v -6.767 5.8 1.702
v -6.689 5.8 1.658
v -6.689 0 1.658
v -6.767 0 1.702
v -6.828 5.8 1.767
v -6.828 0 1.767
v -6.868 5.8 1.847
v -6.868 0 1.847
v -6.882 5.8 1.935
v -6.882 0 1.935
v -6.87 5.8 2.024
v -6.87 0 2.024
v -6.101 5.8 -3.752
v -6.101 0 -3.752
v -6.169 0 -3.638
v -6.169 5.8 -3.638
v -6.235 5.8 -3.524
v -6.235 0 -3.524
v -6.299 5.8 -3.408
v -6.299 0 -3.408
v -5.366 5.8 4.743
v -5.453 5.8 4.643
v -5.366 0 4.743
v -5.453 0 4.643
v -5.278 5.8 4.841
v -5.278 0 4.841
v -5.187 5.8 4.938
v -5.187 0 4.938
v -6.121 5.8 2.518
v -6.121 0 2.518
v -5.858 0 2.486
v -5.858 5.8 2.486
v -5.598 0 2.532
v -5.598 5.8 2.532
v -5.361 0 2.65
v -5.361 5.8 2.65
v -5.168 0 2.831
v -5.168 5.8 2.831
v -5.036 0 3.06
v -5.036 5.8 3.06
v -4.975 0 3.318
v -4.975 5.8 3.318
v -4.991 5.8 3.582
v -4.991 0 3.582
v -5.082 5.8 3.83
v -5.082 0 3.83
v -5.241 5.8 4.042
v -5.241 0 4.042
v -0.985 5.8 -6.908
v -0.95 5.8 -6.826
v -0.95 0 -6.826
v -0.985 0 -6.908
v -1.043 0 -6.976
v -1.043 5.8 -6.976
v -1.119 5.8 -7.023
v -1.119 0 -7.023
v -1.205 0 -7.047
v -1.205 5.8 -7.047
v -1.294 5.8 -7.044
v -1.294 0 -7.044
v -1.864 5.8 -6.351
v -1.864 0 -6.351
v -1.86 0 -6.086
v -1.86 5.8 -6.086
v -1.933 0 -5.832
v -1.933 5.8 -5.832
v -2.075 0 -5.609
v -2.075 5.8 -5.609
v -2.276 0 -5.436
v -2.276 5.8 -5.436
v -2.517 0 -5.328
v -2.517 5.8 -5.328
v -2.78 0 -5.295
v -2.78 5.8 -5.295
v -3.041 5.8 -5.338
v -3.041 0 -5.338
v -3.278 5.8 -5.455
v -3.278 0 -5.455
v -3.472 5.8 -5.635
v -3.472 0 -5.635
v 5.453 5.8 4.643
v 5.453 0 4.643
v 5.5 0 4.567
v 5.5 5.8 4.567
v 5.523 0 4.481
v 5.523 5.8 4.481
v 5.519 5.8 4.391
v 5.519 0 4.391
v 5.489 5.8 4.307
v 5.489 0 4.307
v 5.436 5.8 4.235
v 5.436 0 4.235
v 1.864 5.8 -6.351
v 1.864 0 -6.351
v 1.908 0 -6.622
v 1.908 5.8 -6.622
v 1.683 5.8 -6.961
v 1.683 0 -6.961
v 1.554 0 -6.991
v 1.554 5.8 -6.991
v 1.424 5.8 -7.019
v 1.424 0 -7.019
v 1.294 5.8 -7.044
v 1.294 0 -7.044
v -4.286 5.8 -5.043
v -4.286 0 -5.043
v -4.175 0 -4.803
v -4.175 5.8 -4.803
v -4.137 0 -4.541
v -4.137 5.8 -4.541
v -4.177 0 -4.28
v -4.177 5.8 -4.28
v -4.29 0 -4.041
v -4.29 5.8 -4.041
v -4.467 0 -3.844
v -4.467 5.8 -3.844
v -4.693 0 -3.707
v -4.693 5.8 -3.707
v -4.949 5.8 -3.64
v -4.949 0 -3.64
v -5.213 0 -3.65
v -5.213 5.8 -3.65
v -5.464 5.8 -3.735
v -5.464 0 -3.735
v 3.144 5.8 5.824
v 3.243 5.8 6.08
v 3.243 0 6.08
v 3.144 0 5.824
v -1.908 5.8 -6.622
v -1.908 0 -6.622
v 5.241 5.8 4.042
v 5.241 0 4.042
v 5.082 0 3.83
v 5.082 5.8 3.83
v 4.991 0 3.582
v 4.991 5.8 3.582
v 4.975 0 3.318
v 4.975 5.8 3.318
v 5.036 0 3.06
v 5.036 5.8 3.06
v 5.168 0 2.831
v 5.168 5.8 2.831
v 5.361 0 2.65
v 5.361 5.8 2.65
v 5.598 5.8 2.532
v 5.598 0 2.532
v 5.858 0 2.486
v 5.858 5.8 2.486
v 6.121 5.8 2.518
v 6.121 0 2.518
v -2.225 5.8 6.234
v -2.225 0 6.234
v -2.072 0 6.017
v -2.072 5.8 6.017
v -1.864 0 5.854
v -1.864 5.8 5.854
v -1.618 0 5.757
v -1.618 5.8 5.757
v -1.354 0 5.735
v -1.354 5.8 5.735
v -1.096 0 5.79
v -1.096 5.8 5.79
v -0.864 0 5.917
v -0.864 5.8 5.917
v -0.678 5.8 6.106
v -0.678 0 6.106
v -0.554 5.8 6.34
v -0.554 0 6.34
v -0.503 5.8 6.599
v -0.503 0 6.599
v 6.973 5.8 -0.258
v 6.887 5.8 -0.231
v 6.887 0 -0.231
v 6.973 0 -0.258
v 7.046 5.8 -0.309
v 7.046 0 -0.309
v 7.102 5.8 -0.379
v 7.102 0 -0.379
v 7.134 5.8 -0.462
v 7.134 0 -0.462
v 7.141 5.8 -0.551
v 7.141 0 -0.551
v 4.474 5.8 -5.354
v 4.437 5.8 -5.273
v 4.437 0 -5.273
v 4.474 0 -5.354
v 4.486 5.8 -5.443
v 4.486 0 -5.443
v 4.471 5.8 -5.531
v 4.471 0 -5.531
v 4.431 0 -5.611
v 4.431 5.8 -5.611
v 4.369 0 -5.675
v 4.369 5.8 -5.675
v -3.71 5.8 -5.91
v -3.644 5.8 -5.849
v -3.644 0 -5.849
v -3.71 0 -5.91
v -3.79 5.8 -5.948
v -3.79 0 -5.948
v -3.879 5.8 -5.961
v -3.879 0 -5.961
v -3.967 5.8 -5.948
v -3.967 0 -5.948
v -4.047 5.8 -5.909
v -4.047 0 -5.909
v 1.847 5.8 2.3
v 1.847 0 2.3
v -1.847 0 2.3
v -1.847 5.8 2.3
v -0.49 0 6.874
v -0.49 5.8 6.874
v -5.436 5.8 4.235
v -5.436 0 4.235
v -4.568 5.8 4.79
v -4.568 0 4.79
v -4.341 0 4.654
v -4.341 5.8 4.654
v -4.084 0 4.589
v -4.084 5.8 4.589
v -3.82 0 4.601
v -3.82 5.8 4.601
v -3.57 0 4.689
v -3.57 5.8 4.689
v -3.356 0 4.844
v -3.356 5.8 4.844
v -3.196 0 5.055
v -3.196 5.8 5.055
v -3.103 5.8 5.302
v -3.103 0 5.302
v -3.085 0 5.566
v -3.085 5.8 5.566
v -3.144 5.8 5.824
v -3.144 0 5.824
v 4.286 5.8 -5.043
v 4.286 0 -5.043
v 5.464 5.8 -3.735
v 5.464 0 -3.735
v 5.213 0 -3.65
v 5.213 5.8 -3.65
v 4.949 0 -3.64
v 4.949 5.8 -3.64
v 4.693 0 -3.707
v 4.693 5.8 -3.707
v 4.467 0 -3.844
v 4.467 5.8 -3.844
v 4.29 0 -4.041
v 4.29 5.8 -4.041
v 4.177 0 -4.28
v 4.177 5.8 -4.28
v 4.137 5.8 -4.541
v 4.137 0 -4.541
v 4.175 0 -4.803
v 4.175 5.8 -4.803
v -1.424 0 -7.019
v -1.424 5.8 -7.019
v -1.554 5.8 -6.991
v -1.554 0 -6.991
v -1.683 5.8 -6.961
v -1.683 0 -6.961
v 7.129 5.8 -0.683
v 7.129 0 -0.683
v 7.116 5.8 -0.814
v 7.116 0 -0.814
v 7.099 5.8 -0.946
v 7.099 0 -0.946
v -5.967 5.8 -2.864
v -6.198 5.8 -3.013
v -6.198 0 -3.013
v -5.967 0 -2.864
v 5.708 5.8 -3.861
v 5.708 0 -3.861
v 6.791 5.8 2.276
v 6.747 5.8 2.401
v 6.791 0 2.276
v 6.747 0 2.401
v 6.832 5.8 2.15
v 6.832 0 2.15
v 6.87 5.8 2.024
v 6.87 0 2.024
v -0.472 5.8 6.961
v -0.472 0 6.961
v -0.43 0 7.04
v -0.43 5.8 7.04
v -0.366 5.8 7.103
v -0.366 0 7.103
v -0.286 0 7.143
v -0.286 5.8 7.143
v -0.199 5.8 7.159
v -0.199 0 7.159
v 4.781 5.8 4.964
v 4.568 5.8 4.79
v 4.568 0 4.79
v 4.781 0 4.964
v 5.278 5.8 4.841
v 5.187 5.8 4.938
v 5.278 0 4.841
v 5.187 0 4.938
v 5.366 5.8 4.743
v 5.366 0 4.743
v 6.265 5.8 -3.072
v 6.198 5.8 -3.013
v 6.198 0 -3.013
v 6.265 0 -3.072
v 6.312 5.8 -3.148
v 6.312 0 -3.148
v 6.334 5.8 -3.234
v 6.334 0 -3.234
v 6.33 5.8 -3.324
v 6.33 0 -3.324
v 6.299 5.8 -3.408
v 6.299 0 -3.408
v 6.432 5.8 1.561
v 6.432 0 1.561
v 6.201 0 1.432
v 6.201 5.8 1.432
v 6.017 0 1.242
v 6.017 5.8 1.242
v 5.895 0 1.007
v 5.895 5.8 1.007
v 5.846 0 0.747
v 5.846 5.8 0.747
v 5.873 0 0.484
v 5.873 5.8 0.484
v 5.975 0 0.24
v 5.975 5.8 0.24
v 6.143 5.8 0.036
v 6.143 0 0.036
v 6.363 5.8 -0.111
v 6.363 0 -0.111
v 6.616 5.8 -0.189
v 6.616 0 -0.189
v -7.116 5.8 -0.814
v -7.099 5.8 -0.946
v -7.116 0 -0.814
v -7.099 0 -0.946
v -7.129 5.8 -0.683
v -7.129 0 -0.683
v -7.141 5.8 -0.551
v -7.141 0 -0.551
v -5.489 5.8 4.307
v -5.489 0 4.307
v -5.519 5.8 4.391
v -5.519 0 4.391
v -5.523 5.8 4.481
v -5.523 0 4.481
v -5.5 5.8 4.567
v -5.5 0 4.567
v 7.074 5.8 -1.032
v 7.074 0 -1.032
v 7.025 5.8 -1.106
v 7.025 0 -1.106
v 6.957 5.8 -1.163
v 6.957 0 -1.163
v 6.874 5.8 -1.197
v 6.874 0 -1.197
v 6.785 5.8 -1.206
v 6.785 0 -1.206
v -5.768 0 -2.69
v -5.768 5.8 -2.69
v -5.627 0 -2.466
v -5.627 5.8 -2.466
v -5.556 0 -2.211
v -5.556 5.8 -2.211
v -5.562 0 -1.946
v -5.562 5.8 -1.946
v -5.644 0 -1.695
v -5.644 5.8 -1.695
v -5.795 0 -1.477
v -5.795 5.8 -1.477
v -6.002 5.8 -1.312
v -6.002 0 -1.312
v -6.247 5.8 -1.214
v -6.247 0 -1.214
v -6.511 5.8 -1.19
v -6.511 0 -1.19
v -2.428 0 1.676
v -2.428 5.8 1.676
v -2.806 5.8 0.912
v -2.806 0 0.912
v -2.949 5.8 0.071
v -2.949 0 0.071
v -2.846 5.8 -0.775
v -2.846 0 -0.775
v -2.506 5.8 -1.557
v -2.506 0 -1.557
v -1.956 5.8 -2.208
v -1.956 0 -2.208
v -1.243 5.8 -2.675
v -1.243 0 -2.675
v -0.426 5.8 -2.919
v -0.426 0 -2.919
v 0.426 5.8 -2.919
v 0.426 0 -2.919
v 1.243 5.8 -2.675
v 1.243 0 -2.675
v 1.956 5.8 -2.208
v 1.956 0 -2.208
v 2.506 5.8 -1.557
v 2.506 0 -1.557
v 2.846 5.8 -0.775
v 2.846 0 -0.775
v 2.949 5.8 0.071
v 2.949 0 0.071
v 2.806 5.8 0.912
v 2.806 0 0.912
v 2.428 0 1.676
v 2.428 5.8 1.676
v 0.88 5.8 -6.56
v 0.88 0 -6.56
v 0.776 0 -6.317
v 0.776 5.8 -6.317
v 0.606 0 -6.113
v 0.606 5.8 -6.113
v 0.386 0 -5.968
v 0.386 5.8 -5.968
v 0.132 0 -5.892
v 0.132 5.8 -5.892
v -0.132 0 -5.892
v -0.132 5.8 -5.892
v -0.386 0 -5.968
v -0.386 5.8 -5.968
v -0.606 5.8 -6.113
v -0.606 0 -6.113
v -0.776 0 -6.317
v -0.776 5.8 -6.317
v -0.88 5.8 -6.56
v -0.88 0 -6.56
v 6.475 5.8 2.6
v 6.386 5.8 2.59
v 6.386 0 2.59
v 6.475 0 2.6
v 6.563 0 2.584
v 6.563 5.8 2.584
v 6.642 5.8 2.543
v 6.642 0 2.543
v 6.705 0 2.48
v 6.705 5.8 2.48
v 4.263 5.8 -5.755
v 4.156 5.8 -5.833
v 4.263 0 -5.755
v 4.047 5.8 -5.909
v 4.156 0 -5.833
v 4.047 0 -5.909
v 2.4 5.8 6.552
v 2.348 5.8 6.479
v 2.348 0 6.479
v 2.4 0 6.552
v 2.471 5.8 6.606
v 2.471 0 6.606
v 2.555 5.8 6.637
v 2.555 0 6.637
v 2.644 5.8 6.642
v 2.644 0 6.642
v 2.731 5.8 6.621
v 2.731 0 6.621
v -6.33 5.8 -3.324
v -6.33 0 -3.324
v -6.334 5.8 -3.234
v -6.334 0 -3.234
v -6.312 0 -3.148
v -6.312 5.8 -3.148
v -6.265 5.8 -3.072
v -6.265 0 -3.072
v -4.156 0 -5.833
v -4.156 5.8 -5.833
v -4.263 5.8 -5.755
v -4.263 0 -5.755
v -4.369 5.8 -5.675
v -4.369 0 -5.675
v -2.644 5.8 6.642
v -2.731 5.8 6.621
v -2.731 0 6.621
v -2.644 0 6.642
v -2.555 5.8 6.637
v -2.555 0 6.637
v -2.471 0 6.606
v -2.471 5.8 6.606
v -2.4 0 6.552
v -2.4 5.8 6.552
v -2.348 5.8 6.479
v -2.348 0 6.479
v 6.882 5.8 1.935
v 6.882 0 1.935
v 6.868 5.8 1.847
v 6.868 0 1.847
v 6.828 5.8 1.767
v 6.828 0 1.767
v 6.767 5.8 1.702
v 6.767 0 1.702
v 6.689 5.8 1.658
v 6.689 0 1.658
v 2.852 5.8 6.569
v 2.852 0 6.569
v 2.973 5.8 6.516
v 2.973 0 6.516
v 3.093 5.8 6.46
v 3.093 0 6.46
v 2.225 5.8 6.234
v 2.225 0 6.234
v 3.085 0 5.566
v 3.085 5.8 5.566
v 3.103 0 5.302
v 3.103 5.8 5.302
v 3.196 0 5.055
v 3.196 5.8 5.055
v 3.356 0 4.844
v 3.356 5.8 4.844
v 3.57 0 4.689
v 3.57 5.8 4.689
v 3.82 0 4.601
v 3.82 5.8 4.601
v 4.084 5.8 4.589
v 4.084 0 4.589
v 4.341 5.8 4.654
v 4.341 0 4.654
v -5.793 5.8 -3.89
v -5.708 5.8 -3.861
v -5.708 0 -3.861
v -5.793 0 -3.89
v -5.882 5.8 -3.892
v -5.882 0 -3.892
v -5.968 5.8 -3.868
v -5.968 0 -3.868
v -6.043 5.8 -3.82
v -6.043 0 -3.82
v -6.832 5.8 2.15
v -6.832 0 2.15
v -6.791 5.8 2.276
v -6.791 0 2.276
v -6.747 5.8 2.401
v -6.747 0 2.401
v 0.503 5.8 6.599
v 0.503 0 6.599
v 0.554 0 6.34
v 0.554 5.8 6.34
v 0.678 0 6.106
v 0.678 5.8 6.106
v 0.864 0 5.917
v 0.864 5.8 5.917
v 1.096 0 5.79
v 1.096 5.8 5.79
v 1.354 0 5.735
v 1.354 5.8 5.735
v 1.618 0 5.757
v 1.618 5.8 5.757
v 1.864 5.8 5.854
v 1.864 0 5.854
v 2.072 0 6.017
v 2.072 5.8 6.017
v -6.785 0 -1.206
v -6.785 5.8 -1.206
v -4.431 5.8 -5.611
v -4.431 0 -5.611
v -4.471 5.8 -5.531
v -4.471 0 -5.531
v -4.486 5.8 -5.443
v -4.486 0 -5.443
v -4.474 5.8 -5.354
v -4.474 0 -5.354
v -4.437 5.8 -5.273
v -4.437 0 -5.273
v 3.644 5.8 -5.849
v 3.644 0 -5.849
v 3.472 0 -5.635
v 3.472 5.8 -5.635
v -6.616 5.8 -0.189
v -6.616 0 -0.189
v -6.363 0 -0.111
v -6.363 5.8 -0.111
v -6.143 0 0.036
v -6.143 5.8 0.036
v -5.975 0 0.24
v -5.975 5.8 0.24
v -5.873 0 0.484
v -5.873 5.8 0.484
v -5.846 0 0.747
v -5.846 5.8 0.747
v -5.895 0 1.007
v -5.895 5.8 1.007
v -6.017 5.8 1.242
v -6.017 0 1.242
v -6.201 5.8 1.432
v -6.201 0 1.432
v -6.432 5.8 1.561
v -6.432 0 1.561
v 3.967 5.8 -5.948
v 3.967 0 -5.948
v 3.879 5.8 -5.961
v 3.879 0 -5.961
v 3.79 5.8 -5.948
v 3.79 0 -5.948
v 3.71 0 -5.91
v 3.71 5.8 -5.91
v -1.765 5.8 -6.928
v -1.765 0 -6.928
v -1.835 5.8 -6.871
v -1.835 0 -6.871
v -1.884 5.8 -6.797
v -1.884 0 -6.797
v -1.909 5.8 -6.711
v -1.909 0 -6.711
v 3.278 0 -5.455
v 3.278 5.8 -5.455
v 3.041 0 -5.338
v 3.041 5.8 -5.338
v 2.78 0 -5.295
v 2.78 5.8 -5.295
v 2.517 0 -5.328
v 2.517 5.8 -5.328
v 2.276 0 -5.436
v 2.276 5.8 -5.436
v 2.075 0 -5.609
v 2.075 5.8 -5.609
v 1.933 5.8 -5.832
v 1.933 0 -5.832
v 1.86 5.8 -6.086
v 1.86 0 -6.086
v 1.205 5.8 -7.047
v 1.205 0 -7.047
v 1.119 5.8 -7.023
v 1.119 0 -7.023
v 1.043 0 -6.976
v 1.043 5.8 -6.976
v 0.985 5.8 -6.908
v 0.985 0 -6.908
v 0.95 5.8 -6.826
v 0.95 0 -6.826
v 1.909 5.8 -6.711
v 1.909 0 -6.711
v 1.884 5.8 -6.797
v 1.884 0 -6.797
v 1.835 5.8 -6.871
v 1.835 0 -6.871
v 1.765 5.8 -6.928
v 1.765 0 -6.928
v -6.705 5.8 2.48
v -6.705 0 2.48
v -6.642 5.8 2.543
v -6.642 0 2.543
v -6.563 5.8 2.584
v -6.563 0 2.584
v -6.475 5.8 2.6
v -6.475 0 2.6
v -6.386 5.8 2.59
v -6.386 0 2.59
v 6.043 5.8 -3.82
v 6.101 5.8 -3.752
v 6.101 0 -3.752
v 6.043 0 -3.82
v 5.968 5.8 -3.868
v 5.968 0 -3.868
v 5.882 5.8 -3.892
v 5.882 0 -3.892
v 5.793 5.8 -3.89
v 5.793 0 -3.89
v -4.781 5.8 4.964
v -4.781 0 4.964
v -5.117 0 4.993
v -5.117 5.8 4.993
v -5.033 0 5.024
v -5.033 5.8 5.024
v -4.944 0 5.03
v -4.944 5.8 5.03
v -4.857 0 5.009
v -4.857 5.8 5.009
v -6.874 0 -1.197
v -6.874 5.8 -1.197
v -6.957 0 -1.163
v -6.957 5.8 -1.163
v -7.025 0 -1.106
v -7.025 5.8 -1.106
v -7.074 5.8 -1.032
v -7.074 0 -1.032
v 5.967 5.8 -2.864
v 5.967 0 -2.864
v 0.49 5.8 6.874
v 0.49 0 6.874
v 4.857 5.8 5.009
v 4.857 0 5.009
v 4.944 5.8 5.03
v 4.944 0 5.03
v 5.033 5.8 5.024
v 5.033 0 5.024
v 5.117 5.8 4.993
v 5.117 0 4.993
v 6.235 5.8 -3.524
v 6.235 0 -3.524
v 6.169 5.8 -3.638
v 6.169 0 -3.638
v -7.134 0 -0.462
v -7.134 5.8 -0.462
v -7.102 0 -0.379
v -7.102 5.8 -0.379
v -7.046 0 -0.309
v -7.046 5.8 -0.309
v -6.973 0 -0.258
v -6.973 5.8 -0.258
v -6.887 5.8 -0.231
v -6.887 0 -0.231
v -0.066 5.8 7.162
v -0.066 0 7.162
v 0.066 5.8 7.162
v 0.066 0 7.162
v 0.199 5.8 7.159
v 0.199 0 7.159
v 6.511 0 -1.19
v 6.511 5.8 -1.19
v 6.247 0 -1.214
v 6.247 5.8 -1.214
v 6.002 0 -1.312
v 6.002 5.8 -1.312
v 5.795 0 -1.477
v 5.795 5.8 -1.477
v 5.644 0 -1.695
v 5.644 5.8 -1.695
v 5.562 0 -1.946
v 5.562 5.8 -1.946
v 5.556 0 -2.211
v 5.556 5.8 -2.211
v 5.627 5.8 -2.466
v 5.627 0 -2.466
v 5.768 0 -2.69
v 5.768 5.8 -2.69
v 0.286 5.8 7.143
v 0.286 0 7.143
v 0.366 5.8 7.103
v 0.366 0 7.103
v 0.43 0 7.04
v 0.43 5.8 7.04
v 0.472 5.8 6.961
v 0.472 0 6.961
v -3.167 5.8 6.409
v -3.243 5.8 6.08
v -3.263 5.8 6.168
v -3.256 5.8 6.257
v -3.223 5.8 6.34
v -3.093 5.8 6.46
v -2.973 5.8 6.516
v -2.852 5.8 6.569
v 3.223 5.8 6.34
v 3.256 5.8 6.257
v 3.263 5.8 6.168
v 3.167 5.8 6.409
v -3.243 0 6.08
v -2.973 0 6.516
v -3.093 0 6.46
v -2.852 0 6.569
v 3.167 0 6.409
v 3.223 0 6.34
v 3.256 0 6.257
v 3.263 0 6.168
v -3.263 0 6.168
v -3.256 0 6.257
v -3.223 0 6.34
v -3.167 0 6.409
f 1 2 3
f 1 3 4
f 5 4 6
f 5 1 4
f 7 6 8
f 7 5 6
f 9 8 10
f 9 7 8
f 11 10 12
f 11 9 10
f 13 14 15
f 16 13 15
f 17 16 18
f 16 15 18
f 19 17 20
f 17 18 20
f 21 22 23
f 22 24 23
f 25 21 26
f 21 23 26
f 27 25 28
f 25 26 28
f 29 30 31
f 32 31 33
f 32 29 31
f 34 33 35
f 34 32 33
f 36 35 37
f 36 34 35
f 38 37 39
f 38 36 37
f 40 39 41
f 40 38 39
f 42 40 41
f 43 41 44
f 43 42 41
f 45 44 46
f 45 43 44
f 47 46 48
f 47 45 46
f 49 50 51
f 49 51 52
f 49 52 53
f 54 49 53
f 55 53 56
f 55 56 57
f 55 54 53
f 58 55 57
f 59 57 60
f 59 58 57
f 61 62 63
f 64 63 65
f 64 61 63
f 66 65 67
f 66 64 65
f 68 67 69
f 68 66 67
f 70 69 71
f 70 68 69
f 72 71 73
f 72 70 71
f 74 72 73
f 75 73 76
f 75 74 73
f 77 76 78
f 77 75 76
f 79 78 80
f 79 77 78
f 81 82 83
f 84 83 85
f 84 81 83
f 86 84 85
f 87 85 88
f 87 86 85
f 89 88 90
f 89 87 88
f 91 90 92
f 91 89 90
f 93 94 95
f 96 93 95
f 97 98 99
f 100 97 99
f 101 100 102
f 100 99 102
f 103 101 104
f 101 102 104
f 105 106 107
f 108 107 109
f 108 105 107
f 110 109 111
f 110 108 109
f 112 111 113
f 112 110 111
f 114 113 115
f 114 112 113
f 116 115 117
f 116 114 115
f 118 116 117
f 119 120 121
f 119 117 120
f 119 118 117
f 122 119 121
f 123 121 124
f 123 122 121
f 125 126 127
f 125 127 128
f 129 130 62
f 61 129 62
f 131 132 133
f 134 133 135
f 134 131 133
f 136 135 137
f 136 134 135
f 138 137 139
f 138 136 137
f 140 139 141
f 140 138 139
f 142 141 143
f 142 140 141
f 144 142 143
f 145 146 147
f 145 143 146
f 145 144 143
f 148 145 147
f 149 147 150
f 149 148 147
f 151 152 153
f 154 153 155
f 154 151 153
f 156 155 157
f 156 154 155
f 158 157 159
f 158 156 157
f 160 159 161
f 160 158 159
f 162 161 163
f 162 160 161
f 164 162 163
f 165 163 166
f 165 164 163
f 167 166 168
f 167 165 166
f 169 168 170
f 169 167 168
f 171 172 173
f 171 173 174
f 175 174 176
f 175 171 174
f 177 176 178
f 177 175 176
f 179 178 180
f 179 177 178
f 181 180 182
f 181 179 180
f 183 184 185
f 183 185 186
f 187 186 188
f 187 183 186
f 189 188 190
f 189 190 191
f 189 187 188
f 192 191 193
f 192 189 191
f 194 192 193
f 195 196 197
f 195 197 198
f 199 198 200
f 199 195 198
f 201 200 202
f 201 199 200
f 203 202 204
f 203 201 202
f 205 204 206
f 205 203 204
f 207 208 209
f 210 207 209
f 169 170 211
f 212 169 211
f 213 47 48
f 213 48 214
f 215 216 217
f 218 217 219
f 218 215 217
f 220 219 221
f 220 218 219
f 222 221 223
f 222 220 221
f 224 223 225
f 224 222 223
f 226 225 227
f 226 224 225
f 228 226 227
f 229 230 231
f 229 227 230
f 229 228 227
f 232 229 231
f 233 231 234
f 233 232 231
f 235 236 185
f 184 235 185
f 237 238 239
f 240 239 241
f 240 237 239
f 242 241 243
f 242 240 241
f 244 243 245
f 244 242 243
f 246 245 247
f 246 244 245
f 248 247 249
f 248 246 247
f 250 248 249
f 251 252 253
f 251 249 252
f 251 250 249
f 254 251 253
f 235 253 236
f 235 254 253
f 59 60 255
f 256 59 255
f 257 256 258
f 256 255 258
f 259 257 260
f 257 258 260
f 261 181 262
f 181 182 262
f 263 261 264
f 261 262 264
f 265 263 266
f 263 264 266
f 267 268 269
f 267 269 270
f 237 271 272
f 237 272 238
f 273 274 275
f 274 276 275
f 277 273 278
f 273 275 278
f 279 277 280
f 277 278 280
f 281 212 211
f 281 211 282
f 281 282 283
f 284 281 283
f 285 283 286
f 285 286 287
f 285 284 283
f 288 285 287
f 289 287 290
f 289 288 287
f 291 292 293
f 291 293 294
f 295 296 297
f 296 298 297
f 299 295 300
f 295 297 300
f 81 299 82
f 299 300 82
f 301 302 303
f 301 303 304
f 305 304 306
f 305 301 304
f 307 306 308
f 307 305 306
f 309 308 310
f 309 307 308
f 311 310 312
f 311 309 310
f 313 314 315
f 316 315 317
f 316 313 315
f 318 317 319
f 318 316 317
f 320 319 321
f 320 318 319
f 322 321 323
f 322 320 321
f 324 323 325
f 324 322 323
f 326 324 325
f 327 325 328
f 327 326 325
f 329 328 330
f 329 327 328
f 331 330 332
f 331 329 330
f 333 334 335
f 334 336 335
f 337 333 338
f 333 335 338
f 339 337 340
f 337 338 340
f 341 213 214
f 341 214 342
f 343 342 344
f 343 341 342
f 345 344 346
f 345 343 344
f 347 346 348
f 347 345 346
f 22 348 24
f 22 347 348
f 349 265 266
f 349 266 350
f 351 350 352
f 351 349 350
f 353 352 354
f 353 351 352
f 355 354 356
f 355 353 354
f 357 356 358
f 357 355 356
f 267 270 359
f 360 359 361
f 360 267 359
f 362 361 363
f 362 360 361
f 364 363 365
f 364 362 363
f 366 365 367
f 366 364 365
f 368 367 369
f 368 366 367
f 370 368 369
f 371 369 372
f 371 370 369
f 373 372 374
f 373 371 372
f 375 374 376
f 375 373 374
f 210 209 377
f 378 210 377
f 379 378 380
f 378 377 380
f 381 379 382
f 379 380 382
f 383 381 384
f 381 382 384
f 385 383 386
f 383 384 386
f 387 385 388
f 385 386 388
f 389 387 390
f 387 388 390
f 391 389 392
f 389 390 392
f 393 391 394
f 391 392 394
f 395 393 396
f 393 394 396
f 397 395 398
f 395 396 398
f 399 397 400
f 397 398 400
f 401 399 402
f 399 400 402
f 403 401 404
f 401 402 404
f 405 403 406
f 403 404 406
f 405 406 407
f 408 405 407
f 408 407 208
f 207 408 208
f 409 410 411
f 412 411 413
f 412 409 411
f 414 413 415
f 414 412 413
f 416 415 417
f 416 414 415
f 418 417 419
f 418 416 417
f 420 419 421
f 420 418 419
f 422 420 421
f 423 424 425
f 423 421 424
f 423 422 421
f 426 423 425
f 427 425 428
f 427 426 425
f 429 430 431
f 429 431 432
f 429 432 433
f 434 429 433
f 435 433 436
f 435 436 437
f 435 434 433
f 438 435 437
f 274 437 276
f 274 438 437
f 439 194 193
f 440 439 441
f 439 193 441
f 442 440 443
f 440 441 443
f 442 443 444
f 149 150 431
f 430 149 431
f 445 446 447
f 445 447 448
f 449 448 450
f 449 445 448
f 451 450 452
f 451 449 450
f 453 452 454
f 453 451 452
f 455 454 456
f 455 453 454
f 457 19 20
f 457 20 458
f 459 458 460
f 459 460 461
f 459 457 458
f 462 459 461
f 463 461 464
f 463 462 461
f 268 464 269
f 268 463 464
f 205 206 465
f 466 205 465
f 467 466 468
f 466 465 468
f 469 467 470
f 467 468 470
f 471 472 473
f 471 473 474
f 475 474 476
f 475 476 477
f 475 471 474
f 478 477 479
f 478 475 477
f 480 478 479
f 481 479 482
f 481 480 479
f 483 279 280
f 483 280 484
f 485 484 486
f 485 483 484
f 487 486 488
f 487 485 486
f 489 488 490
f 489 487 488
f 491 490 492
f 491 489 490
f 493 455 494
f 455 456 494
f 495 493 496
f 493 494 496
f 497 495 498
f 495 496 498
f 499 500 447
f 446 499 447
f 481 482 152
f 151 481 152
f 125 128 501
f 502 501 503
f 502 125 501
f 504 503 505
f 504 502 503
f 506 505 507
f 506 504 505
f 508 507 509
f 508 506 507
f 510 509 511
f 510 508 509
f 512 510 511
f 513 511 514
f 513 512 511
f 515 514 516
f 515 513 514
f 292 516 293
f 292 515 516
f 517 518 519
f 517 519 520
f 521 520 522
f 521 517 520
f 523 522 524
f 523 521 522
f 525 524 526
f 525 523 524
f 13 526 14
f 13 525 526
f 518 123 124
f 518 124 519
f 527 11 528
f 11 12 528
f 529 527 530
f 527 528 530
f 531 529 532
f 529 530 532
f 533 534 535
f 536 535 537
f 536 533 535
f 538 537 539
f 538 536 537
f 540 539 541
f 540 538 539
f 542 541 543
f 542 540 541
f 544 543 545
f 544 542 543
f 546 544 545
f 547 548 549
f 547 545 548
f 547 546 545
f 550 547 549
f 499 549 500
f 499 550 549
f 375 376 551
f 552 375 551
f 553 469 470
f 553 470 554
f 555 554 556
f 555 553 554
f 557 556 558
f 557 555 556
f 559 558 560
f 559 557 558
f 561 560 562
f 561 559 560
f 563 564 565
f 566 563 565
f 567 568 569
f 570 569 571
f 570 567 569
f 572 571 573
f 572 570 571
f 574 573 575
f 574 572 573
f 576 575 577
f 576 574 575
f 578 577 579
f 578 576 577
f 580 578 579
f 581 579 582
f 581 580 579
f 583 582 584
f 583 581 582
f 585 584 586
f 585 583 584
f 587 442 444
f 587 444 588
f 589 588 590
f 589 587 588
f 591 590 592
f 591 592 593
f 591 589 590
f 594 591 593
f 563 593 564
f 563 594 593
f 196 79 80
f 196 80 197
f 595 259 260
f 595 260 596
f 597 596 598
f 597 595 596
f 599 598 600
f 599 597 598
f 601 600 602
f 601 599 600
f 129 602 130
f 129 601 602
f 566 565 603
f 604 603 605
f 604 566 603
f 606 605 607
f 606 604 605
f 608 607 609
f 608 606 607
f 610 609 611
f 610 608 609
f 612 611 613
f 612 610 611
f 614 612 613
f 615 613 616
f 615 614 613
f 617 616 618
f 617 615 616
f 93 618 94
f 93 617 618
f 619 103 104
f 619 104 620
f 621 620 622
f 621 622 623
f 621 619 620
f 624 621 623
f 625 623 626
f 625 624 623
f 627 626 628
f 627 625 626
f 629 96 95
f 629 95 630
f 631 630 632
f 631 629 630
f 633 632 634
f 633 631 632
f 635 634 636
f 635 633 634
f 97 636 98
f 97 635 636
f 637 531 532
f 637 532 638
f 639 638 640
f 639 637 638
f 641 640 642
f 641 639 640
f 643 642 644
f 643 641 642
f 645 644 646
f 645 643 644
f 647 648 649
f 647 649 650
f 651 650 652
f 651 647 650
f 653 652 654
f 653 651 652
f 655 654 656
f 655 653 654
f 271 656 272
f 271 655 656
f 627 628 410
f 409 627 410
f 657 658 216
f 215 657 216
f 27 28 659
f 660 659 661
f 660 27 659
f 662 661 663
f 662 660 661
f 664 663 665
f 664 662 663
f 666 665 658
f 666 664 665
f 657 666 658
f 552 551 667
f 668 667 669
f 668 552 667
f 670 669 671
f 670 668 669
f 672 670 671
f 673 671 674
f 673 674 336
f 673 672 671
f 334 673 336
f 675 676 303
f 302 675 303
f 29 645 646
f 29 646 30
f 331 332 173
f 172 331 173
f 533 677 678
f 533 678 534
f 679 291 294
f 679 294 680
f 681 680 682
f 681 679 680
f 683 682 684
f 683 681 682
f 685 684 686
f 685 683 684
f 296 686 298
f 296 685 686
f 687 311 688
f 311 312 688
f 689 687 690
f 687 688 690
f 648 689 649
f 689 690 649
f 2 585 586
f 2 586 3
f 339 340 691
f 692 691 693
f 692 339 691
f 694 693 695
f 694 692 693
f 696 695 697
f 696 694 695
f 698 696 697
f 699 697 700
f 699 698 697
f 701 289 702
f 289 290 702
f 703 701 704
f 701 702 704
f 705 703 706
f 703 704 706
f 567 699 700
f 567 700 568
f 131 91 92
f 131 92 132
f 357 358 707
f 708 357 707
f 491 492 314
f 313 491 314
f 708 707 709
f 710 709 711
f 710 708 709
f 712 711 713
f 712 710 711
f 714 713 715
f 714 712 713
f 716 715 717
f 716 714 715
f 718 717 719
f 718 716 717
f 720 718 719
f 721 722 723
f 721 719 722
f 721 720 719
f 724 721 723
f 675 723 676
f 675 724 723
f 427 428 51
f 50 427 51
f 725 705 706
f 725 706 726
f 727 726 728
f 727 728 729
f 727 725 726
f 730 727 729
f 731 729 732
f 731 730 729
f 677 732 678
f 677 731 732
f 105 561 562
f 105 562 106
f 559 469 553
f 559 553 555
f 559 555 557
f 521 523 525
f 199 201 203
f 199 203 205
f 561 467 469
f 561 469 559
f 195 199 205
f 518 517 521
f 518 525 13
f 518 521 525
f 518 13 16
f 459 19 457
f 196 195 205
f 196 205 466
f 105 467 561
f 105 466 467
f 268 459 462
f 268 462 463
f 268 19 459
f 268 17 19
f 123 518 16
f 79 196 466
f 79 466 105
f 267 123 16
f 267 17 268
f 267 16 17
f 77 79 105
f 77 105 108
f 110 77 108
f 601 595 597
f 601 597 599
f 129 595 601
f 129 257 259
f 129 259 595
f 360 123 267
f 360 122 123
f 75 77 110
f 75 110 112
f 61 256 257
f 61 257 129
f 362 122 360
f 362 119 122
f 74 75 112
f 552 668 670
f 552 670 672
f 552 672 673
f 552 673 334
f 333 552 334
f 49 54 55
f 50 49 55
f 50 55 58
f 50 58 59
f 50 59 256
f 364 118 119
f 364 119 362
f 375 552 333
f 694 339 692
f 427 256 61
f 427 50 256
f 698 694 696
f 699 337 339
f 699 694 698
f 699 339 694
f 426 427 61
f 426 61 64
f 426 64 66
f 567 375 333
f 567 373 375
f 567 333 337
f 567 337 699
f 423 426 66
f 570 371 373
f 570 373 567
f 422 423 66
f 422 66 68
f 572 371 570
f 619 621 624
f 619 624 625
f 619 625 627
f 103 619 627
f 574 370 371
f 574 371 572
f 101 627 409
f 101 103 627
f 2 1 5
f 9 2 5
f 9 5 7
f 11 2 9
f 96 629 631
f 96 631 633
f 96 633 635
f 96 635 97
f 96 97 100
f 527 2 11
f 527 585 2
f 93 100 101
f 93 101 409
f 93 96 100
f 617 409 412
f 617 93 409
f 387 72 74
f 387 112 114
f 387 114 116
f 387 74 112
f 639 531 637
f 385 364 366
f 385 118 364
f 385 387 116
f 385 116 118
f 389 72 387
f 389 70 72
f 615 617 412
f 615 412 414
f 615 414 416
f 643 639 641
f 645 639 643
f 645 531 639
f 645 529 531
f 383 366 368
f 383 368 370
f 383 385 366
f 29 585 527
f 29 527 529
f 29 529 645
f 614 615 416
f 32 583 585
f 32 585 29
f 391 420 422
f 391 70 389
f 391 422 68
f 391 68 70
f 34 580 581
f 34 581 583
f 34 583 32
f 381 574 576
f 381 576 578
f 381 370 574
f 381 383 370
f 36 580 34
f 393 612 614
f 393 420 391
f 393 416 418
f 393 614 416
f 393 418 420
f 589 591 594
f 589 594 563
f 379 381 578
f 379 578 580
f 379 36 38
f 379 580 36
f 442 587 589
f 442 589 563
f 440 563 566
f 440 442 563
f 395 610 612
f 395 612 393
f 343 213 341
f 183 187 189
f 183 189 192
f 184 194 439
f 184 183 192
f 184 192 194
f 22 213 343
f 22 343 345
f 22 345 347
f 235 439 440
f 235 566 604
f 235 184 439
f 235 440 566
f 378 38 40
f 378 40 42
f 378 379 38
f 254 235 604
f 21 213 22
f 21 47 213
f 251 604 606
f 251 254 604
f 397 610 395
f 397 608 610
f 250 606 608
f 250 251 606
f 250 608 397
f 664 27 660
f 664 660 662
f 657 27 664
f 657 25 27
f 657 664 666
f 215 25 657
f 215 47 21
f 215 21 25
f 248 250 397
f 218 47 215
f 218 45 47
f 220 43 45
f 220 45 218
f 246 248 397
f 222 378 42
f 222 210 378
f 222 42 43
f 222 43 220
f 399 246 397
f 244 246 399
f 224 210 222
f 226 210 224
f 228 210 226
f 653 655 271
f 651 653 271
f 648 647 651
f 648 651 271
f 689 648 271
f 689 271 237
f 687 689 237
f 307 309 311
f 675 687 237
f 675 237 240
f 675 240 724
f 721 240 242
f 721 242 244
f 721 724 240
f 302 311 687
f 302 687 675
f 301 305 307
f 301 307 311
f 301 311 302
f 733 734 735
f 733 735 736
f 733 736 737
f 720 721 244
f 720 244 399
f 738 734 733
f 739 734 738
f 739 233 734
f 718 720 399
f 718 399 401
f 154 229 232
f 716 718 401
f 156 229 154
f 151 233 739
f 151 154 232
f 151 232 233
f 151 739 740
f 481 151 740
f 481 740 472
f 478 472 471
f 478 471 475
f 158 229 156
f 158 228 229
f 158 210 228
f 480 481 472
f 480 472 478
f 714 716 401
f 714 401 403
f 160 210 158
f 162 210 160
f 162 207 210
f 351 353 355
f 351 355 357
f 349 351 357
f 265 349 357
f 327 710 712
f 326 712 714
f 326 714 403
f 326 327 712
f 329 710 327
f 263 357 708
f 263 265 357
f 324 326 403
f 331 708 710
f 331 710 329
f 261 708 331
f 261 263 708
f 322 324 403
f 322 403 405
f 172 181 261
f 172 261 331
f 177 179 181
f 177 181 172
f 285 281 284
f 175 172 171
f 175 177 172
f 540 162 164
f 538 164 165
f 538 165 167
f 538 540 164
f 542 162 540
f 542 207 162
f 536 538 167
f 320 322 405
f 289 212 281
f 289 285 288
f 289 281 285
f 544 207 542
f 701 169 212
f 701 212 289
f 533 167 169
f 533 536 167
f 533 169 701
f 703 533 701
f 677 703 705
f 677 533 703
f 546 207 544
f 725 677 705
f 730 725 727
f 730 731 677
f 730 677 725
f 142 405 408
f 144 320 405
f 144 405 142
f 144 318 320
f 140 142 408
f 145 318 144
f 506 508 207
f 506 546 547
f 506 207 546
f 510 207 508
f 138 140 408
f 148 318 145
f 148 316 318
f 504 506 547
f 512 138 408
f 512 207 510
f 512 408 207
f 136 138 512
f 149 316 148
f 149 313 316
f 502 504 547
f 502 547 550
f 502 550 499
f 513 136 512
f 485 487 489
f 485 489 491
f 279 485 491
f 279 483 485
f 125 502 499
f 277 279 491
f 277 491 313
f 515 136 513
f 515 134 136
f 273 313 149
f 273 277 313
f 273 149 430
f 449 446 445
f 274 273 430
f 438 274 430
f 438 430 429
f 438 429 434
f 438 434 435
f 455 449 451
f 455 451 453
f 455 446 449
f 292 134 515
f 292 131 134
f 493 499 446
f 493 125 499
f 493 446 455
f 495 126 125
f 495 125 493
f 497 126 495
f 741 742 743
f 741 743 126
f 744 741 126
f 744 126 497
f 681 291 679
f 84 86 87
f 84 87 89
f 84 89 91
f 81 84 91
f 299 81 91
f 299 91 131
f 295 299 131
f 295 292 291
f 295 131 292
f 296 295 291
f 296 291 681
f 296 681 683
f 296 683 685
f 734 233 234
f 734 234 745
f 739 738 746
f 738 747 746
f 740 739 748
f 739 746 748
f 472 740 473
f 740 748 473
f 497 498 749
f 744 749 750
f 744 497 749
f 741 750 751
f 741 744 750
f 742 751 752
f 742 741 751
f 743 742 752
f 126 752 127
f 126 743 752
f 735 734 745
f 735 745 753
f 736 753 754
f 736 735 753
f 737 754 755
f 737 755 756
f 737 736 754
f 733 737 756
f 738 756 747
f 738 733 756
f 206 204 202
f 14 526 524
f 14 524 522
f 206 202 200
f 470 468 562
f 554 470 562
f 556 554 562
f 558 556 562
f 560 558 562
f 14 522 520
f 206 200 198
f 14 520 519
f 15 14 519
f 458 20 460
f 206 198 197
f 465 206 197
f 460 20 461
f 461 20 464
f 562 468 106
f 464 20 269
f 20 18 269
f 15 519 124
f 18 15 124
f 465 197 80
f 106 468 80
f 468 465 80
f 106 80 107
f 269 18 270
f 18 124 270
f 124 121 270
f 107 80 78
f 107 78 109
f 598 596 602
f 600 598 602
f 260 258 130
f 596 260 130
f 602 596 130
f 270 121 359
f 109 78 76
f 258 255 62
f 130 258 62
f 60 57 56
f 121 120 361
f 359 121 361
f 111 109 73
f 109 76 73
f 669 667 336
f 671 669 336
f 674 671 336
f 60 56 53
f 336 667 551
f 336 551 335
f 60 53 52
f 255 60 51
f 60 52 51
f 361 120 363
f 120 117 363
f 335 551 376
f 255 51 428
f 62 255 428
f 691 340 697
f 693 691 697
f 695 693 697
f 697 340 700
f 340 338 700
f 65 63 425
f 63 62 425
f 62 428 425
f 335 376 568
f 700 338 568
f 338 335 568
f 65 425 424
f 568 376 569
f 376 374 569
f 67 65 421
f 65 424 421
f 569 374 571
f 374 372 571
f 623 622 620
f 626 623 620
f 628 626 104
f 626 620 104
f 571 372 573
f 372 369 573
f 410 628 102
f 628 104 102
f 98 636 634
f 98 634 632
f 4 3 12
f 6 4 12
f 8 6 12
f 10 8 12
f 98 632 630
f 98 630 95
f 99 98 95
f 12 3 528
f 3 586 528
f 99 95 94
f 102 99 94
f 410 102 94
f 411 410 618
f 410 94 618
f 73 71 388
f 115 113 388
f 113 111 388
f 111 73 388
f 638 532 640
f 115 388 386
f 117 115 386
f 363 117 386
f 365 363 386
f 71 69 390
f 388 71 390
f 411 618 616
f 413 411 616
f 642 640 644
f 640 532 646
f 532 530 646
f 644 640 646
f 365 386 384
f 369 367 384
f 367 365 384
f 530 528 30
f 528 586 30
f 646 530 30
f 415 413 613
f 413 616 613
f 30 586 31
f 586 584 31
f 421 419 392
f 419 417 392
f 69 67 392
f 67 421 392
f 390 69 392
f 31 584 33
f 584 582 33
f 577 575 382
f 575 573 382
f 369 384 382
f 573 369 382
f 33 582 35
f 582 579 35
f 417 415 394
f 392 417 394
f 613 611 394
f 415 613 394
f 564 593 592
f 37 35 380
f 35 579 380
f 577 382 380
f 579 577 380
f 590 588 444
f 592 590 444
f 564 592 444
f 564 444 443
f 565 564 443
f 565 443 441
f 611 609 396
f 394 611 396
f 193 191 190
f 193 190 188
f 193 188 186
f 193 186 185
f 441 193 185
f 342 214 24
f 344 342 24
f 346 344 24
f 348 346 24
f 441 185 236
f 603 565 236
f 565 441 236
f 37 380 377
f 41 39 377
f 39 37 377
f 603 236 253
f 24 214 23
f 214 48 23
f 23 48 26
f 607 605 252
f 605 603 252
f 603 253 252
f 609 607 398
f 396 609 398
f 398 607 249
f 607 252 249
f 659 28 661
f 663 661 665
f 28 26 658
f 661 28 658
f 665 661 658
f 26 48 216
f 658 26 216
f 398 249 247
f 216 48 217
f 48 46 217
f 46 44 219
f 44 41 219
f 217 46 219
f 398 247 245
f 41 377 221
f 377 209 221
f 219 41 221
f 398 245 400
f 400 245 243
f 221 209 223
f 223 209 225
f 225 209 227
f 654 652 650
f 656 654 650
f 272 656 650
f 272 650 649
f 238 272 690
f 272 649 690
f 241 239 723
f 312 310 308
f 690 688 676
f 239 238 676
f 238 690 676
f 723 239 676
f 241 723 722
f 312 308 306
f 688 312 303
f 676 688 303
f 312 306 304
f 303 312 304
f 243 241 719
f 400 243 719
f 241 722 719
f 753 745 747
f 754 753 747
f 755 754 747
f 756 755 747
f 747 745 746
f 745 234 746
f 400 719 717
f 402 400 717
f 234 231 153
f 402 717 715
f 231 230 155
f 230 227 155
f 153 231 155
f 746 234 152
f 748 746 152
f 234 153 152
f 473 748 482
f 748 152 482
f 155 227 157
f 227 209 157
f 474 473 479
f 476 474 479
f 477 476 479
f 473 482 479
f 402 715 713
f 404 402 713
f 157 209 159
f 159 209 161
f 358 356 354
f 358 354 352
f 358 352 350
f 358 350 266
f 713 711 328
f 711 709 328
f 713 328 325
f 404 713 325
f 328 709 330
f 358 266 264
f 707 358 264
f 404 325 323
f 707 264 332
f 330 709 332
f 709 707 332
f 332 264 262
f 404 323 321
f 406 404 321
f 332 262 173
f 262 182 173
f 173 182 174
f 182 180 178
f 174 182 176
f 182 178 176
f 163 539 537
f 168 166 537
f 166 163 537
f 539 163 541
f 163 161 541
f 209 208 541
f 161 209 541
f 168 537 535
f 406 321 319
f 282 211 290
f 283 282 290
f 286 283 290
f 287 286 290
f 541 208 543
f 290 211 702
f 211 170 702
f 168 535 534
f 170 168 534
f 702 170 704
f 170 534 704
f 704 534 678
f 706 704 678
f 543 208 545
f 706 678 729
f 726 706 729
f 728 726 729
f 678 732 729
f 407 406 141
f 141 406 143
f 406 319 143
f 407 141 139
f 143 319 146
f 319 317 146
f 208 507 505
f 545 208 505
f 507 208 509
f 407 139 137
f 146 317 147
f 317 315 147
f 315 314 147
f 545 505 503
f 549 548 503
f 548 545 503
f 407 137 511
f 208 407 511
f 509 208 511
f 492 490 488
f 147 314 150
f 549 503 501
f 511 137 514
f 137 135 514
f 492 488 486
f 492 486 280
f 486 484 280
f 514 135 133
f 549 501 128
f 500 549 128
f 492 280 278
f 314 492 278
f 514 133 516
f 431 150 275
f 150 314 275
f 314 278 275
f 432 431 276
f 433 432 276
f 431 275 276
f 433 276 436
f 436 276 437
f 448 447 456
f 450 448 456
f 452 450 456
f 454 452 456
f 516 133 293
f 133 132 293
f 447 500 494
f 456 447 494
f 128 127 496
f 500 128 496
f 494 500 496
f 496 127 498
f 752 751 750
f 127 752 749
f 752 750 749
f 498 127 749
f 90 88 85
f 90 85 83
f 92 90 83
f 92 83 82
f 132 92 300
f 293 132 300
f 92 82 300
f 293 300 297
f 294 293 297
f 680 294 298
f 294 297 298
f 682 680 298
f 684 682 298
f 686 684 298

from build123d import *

# Parameters (mm, degrees)
SKETCH1_R           = 7.161972439
BOSS_EXTRUDE1_DEPTH = 5.8
CUT_EXTRUDE1_DEPTH  = 12.671662197
CIRPATTERN1_COUNT   = 15
CUT_EXTRUDE2_DEPTH  = 12.659198501


with BuildPart() as part:
    # Sketch1 → Boss-Extrude1 (new body)
    with BuildSketch(Plane(origin=(0, 0, 0), x_dir=(1, 0, 0), z_dir=(0, 1, 0))):
        with Locations(Location((0, 0, 0), (0, 0, 270))):
            Circle(SKETCH1_R)
    extrude(amount=BOSS_EXTRUDE1_DEPTH)

    # Sketch2 → Cut-Extrude1 (cut, through all)
    with BuildSketch(Plane(origin=(0, 5.8, 0), x_dir=(1, 0, 0), z_dir=(0, 1, 0))):
        with BuildLine():
            Line((-0.879885324, 6.559804793), (-0.95, 6.825530337))
            ThreePointArc((-0.95, 6.825530337), (-1.079308013, 7.002279754), (-1.294287054, 7.044052118))
            ThreePointArc((-1.294287054, 7.044052118), (-2.118539526, 6.841464719), (-2.913036628, 6.54278739))
            Line((-2.913036628, 6.54278739), (-2.913036628, 7.161972439))
            Line((-2.913036628, 7.161972439), (2.913036628, 7.161972439))
            Line((2.913036628, 7.161972439), (2.913036628, 6.54278739))
            ThreePointArc((2.913036628, 6.54278739), (2.118539526, 6.841464719), (1.294287054, 7.044052118))
            ThreePointArc((1.294287054, 7.044052118), (1.079308013, 7.002279754), (0.95, 6.825530337))
            Line((0.95, 6.825530337), (0.879885324, 6.559804793))
            ThreePointArc((0.879885324, 6.559804793), (0, 5.881972439), (-0.879885324, 6.559804793))
        make_face()
    cut_extrude1 = extrude(amount=-CUT_EXTRUDE1_DEPTH, mode=Mode.SUBTRACT)

    # CirPattern1: Cut-Extrude1 ×15 about axis
    cirpattern1_axis = Axis((0, 0, 0), (0, 1, 0))
    for i in range(1, CIRPATTERN1_COUNT):
        add(cut_extrude1.rotate(cirpattern1_axis, i * 360 / CIRPATTERN1_COUNT), mode=Mode.SUBTRACT)

    # Sketch3 → Cut-Extrude2 (cut, through all)
    with BuildSketch(Plane.XZ):
        with BuildLine():
            Line((1.84729532, 2.3), (-1.84729532, 2.3))
            ThreePointArc((-1.84729532, 2.3), (0, -2.95), (1.84729532, 2.3))
        make_face()
    extrude(amount=-CUT_EXTRUDE2_DEPTH, mode=Mode.SUBTRACT)


solid = part.part
